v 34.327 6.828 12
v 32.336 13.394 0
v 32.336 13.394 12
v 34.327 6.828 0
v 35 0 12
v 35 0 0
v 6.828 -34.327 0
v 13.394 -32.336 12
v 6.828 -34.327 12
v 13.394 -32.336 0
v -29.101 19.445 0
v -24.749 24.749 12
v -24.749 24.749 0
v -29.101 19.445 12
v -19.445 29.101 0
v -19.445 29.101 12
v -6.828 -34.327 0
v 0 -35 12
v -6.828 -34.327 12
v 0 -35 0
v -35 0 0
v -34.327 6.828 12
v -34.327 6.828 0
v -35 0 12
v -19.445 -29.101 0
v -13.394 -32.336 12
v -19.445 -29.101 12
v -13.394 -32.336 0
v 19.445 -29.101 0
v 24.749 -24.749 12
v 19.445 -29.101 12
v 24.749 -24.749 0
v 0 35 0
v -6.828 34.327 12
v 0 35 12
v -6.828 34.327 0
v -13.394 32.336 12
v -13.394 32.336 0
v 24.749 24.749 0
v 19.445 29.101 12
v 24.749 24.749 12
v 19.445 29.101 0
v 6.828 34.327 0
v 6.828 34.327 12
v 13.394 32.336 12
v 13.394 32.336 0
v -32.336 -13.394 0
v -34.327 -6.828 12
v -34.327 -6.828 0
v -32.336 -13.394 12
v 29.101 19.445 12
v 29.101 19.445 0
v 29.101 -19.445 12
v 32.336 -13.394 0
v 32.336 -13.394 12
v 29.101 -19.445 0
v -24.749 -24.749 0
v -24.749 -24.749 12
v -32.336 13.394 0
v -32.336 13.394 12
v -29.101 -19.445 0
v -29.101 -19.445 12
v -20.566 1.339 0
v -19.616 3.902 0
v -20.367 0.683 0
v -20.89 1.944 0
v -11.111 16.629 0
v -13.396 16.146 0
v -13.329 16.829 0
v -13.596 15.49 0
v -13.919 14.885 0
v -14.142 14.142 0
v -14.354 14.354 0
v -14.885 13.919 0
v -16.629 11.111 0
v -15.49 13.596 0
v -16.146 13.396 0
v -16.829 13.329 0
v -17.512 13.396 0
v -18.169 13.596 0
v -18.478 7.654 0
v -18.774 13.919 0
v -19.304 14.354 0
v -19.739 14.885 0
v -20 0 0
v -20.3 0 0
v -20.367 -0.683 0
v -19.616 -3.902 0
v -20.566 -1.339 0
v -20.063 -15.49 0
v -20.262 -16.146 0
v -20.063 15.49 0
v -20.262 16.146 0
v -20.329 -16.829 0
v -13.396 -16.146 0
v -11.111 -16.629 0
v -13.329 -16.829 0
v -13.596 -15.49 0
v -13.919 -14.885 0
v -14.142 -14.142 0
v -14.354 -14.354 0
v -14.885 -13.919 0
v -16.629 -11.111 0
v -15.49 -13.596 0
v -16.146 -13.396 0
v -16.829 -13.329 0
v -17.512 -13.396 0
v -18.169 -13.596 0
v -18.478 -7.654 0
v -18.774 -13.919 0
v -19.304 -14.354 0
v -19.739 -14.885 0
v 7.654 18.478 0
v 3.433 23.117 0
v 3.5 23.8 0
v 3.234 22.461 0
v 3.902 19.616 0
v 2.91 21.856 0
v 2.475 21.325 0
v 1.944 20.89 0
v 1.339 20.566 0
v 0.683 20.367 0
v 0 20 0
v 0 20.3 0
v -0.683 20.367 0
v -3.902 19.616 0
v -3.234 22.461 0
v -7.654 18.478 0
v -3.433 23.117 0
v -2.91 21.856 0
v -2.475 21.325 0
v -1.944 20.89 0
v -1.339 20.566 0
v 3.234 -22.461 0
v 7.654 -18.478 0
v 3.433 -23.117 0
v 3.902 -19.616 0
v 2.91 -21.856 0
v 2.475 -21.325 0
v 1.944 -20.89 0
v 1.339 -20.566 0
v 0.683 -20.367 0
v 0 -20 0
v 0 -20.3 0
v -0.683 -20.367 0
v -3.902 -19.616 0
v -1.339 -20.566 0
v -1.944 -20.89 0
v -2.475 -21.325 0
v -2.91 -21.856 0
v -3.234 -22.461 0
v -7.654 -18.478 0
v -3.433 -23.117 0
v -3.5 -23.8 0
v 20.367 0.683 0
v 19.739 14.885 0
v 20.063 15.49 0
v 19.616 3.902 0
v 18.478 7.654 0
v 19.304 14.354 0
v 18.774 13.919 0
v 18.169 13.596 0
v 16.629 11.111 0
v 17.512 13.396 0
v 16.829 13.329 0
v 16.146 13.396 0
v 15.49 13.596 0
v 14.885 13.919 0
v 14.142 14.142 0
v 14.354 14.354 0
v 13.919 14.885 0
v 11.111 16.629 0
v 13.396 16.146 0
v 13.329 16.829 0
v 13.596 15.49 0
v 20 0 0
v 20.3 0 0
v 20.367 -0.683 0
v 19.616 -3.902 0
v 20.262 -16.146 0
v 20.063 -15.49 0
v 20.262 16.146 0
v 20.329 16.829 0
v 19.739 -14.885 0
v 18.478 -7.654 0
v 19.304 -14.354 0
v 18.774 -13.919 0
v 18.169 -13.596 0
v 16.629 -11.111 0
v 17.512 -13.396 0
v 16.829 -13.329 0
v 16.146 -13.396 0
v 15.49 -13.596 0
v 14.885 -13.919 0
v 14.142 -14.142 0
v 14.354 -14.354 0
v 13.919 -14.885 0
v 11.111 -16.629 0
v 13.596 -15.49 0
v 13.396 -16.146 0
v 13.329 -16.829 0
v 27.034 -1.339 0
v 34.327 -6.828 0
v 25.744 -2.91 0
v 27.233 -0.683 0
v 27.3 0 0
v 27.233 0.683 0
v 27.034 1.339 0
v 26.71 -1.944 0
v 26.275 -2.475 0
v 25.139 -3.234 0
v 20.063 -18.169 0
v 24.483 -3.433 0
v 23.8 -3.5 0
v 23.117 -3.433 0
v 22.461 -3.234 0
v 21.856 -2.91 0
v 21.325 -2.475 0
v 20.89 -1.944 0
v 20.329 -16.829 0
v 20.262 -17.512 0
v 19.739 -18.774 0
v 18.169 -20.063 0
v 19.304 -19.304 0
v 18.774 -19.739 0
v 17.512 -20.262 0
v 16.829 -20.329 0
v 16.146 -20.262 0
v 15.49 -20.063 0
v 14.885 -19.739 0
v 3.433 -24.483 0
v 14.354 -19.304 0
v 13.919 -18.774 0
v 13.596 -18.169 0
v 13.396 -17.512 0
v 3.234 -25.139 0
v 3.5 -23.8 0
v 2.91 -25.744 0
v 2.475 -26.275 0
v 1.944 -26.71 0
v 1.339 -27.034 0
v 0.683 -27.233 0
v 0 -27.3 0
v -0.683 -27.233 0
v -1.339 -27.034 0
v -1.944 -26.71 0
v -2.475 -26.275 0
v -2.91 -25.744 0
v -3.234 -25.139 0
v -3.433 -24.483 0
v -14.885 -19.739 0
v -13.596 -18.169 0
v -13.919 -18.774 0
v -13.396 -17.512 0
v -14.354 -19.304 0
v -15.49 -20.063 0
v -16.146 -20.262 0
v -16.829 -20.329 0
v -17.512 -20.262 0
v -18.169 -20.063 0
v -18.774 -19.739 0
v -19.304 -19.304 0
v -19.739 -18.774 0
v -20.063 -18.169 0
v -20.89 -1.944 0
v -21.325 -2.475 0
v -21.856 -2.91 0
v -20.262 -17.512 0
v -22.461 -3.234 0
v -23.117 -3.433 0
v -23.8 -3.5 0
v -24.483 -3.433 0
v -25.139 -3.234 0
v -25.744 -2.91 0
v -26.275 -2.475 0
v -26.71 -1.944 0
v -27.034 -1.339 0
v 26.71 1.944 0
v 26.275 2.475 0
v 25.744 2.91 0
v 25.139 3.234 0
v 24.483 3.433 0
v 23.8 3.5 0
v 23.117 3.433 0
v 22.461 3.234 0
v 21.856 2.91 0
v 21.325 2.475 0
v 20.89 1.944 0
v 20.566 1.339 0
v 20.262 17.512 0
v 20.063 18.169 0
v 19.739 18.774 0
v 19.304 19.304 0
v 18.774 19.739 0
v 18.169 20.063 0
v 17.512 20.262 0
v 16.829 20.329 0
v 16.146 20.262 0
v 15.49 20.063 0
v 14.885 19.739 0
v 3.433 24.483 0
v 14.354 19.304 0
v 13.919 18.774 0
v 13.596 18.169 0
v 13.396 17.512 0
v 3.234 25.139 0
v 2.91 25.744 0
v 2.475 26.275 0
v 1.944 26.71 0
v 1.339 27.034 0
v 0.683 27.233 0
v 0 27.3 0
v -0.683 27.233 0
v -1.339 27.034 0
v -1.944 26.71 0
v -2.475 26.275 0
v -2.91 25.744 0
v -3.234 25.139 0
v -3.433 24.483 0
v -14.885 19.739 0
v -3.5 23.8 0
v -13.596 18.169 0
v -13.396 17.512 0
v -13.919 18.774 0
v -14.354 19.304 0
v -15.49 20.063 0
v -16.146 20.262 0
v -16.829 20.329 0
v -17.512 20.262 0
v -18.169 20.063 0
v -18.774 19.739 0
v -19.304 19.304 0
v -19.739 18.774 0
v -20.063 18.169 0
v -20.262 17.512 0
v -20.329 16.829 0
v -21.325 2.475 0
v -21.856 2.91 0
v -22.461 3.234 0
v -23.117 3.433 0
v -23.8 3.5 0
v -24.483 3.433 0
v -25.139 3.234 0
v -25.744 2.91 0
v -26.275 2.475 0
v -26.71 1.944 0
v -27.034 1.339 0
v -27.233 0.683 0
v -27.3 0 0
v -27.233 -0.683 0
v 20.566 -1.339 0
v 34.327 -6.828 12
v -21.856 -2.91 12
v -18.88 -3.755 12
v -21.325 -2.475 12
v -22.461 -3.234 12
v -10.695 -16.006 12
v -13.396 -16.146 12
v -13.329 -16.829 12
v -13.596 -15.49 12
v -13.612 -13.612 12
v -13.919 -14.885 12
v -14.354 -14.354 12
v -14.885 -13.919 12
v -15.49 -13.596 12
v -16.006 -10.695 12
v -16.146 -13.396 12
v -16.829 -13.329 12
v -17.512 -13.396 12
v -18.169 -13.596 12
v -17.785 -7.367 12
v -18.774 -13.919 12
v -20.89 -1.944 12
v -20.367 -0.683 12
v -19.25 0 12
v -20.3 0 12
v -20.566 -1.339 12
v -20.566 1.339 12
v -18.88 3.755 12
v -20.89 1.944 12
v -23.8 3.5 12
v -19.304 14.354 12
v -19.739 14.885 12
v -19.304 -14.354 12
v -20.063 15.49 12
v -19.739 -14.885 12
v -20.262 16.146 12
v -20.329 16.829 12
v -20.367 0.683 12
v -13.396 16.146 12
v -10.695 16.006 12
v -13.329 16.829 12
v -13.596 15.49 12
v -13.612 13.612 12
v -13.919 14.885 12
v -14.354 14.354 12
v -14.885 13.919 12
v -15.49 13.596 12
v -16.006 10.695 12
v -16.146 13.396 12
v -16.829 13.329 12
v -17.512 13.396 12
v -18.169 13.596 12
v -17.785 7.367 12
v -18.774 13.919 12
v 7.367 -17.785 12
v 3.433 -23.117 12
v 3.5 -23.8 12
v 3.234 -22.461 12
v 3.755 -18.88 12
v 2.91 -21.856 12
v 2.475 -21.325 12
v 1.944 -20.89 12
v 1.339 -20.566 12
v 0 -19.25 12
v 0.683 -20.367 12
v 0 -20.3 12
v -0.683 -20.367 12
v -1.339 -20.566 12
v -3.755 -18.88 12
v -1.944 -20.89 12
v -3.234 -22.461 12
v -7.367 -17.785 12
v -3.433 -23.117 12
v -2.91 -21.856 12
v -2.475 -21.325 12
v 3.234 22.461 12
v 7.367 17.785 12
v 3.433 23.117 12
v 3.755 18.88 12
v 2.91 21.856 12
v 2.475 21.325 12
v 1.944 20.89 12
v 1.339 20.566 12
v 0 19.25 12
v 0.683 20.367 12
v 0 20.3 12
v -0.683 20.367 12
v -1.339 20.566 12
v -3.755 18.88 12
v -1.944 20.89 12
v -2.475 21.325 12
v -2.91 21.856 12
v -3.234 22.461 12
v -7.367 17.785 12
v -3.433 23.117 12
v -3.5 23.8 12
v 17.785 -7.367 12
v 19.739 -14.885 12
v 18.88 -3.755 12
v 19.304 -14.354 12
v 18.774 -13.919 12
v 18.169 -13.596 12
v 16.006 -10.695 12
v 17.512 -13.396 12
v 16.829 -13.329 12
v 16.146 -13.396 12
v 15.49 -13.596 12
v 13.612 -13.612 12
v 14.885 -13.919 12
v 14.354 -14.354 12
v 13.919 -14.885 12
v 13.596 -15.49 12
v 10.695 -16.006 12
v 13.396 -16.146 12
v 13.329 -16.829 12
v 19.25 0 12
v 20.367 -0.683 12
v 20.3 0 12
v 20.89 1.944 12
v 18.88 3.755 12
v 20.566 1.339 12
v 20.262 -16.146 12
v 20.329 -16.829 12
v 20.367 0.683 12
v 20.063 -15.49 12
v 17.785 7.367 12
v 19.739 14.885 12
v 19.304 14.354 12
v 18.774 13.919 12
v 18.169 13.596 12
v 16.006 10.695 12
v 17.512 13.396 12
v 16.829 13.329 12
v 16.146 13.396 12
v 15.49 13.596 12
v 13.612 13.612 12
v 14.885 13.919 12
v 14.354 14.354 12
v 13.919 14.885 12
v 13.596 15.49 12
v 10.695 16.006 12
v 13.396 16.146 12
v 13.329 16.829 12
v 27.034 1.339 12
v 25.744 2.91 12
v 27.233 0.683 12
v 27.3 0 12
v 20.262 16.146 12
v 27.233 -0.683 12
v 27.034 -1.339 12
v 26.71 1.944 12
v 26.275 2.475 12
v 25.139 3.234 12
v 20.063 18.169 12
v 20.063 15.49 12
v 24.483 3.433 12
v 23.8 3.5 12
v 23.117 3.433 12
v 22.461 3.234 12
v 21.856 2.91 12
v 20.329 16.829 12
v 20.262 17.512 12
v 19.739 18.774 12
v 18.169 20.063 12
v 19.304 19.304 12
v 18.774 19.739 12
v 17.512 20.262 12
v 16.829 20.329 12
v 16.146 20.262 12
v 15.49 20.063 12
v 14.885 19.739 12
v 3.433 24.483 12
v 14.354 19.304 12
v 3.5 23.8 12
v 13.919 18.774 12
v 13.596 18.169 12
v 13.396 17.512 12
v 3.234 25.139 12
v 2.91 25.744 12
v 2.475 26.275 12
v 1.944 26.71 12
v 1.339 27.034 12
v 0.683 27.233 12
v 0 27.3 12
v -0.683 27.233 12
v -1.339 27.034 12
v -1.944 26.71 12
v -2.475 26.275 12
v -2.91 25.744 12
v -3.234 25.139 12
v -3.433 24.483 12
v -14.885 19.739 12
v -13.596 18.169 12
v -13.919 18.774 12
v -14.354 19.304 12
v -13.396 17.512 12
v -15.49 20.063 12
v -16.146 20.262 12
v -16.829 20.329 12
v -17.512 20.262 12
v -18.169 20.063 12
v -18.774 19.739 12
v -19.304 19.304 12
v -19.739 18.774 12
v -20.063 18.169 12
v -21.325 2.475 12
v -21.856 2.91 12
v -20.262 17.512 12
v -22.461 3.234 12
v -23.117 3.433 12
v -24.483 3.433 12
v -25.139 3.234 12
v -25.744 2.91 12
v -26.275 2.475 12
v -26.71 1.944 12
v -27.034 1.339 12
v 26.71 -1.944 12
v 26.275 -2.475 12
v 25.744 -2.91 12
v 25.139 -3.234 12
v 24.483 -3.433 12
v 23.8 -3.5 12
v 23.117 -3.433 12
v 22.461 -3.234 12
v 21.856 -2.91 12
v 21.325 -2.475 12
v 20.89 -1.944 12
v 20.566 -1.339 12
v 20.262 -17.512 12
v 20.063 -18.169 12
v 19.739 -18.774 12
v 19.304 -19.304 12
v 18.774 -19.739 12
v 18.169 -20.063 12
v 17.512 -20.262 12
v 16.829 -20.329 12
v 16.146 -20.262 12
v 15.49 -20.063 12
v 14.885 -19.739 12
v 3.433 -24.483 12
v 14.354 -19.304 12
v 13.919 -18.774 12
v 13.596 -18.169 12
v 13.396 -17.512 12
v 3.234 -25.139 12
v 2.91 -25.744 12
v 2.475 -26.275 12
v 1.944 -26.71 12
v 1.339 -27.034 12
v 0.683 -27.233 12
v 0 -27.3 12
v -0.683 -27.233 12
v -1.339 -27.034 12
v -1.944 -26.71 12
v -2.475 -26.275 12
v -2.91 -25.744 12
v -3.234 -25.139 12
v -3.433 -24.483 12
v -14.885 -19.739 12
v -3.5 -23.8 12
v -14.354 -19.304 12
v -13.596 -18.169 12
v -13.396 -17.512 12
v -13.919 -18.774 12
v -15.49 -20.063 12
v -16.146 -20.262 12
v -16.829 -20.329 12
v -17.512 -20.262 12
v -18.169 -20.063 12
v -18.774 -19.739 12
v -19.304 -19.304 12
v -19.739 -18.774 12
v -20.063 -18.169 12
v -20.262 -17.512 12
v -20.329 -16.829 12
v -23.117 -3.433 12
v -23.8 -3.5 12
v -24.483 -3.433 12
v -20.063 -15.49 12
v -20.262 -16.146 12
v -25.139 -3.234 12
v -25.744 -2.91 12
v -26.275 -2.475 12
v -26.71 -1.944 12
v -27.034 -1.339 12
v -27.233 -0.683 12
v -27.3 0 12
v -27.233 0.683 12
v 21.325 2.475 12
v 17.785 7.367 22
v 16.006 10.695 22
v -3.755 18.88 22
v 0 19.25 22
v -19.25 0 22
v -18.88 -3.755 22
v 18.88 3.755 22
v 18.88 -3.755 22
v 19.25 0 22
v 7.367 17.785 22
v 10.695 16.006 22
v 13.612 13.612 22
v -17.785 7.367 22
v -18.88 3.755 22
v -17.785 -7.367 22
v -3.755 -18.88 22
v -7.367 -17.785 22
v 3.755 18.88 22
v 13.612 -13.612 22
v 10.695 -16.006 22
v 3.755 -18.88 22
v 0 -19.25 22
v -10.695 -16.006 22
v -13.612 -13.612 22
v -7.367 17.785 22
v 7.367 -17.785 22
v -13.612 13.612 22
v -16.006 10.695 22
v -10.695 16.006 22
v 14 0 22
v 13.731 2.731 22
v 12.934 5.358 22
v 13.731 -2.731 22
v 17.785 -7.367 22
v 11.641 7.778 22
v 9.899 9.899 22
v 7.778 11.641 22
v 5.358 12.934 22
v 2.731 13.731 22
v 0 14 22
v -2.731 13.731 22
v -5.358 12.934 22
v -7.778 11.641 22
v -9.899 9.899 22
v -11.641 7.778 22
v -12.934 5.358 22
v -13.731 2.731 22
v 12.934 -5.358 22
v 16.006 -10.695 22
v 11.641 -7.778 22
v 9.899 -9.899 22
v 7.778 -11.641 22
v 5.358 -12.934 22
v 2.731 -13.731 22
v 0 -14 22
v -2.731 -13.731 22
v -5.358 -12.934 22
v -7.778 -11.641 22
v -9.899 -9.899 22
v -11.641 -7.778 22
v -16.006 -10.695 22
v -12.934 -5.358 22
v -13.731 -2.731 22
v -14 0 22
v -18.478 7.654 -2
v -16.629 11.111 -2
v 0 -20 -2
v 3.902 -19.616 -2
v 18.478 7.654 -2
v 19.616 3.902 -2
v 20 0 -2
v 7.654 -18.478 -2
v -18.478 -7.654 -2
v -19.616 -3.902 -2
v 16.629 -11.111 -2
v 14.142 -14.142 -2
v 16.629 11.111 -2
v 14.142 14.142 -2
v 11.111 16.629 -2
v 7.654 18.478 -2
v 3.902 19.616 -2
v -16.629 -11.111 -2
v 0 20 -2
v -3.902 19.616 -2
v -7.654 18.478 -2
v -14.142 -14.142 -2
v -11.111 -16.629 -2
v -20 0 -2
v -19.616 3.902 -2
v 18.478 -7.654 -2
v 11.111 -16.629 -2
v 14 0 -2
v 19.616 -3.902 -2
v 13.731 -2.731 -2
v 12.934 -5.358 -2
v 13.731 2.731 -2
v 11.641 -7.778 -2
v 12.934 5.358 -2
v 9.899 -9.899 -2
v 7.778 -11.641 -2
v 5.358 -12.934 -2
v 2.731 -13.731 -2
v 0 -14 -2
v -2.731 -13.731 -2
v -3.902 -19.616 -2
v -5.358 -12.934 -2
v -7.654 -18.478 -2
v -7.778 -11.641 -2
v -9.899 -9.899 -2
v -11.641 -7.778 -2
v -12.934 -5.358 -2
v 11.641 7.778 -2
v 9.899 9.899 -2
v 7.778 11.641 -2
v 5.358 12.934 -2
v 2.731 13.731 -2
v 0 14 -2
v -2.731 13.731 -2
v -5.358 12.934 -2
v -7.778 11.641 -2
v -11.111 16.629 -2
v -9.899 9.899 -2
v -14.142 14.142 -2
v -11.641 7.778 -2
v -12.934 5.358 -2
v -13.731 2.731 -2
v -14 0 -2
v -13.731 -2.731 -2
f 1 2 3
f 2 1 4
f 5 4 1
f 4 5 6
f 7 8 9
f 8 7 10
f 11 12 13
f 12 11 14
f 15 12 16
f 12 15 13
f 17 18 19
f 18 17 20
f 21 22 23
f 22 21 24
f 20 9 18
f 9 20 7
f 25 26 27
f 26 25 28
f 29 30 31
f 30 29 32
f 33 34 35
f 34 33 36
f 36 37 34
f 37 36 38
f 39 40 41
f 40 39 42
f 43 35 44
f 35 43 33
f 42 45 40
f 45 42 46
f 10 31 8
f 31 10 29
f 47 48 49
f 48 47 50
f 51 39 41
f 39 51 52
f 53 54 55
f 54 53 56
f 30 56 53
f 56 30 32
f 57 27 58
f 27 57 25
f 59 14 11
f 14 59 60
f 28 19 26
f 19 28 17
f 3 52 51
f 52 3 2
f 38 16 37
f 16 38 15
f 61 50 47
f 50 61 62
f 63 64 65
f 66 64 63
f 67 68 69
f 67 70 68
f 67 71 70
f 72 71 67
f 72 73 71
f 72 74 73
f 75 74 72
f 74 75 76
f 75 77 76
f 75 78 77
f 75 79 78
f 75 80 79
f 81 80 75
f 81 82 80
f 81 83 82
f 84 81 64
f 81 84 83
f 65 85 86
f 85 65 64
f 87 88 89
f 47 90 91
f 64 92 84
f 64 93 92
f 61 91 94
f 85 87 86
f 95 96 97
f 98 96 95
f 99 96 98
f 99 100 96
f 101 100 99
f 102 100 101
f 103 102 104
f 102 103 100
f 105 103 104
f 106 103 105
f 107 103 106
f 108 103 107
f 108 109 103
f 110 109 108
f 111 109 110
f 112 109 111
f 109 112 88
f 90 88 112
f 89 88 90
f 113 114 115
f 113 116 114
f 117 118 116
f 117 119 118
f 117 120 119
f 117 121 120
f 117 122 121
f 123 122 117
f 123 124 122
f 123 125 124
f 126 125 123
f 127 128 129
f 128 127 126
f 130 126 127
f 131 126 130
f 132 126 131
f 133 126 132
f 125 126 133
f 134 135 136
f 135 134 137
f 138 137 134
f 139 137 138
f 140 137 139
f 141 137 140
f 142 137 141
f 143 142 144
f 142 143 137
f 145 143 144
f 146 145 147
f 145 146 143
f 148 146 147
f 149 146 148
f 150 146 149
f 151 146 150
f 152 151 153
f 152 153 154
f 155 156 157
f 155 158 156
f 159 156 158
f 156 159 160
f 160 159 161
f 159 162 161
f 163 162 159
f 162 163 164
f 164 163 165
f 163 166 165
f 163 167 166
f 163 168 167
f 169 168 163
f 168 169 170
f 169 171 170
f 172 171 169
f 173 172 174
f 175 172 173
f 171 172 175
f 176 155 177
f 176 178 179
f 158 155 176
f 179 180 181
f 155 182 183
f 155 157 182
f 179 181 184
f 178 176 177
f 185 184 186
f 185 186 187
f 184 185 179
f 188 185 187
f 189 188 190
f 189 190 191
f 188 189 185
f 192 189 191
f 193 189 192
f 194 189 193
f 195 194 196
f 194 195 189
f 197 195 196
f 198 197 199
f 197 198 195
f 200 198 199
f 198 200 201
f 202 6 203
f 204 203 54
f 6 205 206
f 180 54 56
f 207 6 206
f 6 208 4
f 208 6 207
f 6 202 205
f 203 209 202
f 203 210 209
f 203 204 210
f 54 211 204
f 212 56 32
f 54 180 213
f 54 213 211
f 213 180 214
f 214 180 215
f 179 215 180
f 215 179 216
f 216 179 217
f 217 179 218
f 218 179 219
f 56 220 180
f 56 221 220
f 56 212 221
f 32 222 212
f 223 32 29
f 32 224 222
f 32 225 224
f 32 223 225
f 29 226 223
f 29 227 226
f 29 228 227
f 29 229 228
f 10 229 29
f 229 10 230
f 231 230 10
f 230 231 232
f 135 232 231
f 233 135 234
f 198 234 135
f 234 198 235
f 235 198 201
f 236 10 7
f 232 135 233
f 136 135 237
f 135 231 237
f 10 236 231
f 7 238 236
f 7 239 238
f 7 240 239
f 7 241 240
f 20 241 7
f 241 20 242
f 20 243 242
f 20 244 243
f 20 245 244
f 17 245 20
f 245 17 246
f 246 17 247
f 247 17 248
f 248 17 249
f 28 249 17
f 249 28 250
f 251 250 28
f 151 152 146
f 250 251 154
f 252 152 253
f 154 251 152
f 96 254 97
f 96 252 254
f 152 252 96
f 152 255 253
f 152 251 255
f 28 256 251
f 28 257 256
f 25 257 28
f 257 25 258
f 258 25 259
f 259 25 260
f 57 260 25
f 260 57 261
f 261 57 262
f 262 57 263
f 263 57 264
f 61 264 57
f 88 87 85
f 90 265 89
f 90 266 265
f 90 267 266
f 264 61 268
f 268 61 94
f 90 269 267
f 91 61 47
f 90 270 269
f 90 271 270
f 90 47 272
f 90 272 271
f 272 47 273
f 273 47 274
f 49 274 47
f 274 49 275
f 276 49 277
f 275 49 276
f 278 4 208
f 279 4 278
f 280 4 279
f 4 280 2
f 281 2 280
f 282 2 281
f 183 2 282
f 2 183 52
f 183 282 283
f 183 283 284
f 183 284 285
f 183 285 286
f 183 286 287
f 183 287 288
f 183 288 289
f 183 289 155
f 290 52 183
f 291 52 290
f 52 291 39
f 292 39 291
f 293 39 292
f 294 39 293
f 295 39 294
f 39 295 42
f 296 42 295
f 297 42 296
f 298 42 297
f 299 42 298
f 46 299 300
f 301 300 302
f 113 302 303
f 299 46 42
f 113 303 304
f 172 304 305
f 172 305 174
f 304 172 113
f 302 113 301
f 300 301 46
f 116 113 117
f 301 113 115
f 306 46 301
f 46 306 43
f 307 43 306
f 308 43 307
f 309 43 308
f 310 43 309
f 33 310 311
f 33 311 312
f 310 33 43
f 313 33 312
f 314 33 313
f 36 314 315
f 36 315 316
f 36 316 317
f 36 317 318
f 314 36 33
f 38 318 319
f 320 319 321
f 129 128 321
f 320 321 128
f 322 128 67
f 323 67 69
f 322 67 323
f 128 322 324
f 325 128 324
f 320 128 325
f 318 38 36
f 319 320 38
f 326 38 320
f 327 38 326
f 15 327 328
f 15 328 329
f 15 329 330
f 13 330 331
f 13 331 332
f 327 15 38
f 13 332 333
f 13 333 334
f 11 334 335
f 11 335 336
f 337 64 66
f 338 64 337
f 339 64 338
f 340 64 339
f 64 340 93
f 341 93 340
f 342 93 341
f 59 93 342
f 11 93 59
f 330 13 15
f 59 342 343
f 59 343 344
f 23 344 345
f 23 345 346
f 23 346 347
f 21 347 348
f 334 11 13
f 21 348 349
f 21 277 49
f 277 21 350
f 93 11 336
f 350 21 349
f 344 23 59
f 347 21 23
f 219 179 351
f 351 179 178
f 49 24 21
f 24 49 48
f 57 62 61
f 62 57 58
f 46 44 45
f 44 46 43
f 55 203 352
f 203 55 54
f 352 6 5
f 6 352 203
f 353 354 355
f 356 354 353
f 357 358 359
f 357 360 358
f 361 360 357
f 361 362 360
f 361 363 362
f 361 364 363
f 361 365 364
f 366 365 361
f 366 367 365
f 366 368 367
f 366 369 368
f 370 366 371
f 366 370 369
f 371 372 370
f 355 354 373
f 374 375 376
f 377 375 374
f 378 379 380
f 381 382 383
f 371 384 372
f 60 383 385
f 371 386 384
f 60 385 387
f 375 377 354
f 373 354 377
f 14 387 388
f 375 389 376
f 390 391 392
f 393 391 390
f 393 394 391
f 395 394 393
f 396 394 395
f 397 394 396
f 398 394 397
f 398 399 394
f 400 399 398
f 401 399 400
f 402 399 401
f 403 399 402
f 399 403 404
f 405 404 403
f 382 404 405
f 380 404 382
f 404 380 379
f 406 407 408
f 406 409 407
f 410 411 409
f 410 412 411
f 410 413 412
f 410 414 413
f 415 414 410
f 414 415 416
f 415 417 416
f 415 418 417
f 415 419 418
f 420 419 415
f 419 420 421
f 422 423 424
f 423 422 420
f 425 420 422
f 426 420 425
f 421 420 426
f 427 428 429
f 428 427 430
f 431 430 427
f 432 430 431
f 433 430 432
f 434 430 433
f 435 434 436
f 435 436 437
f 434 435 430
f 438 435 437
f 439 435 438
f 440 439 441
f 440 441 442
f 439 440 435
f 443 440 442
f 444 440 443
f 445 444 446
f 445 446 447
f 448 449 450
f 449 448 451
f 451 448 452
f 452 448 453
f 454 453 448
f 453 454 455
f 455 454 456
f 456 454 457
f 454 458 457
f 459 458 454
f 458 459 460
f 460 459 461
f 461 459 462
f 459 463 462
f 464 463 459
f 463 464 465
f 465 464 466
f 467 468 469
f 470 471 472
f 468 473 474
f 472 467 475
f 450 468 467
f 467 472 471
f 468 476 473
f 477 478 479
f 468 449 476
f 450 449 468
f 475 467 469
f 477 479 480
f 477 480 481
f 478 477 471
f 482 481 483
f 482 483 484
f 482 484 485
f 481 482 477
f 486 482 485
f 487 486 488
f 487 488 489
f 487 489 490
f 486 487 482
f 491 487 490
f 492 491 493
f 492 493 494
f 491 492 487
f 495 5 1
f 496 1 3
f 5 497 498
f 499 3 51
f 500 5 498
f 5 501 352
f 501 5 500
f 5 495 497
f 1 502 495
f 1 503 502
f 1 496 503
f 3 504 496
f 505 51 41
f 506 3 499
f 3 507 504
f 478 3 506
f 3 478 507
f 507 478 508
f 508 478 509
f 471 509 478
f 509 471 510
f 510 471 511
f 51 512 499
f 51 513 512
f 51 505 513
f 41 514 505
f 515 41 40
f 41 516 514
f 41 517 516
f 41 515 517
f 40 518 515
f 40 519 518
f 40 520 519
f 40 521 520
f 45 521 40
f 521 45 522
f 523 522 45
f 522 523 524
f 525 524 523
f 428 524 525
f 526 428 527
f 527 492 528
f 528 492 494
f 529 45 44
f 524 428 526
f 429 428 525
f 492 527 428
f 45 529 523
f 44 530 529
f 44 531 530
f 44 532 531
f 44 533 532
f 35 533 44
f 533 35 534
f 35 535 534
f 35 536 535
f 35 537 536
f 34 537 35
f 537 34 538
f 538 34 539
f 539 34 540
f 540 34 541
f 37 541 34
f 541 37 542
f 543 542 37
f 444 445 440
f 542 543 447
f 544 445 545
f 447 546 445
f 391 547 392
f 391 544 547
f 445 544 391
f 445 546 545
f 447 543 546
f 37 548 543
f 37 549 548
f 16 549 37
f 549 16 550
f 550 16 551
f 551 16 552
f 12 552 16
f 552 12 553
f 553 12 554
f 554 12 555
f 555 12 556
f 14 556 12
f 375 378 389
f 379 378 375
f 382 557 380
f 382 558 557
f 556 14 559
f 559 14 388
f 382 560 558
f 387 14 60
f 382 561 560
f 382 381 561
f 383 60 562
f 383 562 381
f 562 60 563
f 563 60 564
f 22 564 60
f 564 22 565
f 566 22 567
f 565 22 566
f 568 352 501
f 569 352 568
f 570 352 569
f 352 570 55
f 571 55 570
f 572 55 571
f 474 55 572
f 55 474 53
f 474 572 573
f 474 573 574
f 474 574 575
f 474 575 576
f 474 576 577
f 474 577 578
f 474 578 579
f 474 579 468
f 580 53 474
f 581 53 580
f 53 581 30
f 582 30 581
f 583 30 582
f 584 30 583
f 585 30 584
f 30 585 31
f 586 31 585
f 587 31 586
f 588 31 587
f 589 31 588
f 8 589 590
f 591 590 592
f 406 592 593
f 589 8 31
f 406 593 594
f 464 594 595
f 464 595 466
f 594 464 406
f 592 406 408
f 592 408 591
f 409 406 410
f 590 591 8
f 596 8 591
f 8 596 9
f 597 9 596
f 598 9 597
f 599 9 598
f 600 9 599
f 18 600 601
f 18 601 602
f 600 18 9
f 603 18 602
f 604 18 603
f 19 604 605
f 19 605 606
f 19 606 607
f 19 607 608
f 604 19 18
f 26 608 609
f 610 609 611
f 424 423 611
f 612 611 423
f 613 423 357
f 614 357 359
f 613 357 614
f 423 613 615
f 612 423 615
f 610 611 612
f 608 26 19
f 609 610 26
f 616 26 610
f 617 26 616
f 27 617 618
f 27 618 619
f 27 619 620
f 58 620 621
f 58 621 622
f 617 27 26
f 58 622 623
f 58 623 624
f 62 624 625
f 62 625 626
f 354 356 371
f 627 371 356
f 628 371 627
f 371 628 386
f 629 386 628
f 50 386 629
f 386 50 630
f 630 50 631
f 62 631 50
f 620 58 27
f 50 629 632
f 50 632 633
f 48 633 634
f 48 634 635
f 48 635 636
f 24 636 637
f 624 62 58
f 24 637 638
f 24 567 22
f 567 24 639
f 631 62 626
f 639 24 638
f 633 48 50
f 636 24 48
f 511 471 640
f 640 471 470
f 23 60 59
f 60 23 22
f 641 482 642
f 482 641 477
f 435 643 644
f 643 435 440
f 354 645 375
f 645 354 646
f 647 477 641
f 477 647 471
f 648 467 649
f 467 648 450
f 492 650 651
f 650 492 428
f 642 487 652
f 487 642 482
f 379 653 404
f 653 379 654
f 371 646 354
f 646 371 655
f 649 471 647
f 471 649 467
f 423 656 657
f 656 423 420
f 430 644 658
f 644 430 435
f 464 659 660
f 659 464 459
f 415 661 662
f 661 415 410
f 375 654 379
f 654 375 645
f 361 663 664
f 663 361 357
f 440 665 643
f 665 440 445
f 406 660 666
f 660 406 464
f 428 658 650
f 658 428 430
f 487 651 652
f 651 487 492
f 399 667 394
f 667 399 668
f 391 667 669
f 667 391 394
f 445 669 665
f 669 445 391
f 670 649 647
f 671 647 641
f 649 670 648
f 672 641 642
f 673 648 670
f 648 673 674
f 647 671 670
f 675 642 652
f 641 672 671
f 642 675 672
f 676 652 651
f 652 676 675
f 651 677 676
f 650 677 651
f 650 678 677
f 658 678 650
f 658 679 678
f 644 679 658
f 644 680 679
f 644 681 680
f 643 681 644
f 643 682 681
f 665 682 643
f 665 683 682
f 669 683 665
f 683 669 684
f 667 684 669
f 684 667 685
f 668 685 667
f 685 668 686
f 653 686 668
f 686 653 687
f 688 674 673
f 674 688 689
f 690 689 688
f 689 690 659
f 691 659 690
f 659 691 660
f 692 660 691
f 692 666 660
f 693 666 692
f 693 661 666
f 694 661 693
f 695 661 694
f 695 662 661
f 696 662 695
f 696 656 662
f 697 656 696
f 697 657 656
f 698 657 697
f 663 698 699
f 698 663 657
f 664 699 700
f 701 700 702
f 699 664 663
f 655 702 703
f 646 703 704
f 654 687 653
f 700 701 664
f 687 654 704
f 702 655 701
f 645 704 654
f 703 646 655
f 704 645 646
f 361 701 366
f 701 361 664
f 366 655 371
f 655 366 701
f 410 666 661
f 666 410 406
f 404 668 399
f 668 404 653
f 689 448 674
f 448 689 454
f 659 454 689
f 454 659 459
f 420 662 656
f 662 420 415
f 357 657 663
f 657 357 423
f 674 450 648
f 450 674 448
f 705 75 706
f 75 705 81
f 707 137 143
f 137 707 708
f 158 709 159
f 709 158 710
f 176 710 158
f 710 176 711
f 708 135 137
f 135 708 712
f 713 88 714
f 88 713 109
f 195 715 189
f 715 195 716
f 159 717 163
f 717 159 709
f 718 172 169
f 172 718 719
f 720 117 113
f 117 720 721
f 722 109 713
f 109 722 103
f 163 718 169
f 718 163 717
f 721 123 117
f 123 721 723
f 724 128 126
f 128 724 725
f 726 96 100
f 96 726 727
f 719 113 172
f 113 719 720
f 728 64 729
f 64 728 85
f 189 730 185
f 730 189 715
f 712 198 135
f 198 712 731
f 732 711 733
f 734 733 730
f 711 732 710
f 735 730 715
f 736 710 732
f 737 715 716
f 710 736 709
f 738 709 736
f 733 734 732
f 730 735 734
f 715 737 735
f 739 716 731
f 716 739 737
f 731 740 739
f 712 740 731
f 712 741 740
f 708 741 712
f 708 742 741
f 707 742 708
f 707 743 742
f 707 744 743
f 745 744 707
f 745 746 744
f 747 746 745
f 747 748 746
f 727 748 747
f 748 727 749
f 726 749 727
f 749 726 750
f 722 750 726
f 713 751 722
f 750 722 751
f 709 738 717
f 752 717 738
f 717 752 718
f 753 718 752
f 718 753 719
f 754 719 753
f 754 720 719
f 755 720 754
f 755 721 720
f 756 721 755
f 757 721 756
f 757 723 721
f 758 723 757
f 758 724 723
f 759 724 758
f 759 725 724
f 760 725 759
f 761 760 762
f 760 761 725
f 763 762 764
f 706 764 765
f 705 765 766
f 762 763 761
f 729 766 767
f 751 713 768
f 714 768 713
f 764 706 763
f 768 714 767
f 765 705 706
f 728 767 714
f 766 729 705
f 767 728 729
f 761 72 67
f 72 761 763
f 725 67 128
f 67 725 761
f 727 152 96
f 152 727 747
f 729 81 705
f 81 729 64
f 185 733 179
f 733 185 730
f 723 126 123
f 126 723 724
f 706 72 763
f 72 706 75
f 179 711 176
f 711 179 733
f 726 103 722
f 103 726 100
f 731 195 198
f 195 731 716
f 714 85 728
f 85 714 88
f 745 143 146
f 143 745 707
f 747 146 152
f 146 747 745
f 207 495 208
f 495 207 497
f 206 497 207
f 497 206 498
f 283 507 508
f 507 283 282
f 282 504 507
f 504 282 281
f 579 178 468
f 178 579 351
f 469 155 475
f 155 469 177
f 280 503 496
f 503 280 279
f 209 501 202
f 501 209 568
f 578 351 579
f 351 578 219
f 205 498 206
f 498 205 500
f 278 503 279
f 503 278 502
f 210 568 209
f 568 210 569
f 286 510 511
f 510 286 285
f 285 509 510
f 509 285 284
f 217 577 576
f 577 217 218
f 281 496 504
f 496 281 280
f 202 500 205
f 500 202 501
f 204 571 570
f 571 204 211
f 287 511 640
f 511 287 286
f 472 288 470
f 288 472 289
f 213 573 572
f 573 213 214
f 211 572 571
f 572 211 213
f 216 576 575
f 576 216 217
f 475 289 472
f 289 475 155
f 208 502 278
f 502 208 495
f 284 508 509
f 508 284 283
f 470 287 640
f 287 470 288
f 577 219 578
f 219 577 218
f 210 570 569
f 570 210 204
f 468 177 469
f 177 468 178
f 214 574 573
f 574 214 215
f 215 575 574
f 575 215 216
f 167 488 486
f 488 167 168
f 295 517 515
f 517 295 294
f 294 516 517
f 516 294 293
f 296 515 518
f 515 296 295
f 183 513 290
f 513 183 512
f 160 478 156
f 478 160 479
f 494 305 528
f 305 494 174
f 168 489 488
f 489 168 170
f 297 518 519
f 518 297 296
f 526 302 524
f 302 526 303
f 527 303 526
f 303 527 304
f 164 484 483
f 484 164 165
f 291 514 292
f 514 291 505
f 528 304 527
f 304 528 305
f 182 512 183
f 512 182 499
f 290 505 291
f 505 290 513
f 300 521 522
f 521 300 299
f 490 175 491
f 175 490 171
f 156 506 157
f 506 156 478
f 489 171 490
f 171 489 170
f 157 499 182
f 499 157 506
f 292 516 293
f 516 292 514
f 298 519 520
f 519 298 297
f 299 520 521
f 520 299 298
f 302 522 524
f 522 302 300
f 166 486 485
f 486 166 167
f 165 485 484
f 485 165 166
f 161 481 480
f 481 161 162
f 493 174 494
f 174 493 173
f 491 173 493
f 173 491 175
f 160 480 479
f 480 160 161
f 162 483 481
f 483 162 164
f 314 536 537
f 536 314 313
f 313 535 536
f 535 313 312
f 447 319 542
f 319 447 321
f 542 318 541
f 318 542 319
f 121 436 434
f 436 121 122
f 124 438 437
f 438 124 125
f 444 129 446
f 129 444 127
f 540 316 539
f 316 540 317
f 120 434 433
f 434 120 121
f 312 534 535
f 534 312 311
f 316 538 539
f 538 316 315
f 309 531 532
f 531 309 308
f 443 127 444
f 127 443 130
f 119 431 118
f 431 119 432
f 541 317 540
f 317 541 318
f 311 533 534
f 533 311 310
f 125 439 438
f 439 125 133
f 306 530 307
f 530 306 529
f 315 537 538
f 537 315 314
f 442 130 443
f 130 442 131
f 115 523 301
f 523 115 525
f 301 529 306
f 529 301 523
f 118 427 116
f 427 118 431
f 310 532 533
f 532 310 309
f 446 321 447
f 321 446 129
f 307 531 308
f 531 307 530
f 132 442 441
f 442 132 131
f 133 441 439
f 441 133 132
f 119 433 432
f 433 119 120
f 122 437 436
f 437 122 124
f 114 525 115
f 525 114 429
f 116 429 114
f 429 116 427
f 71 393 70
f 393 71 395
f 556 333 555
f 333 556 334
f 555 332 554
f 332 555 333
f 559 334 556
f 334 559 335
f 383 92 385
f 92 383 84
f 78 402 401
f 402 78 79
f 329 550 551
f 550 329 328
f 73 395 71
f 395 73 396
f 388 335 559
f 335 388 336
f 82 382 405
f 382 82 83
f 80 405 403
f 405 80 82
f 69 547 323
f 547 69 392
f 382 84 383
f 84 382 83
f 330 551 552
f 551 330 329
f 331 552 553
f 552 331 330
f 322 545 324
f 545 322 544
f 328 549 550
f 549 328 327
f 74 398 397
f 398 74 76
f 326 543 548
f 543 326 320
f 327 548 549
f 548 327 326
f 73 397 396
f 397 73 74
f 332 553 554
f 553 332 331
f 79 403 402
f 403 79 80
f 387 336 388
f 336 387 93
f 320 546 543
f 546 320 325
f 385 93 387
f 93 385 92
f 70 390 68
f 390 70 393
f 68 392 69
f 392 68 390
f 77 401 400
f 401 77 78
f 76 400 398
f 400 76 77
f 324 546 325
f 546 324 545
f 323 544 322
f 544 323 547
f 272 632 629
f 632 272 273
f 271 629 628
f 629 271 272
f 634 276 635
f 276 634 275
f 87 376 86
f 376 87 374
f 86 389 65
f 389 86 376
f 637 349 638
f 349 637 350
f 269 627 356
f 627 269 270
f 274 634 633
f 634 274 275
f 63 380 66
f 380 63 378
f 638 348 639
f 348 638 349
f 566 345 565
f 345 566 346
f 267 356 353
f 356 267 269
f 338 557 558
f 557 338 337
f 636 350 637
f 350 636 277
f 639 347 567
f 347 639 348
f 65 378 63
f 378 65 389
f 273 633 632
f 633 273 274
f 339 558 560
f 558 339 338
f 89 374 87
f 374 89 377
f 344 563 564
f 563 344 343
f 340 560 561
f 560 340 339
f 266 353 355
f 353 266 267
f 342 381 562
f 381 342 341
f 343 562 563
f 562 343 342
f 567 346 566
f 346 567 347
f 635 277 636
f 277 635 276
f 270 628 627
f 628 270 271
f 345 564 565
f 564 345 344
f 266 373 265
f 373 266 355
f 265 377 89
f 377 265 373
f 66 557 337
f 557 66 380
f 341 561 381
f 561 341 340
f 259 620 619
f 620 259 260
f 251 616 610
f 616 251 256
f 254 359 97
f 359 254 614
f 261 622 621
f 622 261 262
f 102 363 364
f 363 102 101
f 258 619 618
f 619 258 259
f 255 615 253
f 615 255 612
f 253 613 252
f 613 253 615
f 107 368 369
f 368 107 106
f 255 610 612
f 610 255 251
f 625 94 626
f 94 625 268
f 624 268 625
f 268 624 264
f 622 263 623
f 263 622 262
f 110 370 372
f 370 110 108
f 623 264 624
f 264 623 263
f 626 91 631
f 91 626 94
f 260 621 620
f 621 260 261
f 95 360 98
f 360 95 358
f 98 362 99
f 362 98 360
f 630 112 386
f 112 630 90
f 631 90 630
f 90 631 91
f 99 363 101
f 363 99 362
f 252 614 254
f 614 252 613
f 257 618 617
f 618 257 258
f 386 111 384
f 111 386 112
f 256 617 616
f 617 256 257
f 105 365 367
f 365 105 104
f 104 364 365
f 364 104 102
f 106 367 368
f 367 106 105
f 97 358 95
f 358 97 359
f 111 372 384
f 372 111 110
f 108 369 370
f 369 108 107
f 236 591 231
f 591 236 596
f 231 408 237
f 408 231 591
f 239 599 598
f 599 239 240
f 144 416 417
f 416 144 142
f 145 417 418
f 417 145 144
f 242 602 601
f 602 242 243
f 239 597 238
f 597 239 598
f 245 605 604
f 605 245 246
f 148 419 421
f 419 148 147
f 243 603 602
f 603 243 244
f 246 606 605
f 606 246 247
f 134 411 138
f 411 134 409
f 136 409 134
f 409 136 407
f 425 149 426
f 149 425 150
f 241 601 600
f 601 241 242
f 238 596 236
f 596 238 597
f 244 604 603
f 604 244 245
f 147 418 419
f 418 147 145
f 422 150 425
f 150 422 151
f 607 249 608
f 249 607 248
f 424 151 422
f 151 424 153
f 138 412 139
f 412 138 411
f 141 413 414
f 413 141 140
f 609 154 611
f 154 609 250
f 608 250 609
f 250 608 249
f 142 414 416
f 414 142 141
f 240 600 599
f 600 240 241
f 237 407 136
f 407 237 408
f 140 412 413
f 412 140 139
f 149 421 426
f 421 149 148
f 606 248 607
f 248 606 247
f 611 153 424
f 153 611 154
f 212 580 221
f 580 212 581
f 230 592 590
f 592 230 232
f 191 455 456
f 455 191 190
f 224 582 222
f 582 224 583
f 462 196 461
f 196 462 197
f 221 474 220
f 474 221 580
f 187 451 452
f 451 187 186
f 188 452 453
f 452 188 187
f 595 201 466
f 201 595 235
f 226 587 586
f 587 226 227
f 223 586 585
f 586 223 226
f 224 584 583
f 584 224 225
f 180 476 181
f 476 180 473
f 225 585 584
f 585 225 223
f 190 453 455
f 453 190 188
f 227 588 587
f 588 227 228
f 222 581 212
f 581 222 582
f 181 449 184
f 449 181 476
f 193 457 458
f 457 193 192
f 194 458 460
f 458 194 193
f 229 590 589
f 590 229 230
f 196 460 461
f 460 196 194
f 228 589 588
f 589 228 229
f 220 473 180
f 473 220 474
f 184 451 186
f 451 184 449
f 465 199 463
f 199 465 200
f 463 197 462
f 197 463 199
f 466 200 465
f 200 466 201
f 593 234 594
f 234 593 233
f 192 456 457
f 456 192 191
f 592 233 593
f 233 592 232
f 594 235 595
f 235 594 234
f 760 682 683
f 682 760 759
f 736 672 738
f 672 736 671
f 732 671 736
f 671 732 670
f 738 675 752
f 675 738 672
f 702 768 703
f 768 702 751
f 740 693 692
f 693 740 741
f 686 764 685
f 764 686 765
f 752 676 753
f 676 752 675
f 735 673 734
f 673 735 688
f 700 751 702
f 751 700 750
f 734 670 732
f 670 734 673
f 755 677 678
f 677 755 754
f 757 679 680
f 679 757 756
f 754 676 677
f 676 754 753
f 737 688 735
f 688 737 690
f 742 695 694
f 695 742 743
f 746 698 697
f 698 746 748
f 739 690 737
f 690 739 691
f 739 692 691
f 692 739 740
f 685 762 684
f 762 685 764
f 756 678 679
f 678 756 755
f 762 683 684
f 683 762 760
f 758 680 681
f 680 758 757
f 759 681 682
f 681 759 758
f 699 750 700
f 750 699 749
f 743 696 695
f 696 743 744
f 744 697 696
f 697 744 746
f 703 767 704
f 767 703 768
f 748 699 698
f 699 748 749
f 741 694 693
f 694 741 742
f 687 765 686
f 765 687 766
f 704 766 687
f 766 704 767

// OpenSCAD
$fn = 32;

// ----------------------------------------------------------------------
// Bolt-circle flange: 70 mm outside, 8 bolt holes, bore 28 mm
// ----------------------------------------------------------------------

// --- parameters (mm) ---
flange_d = 70;            // flange outside diameter
flange_t = 12;            // flange thickness
bolts = 8;                // number of bolt holes
bolt_d = 7;               // bolt clearance
bolt_r = 23.8;            // bolt circle radius
bore_d = 28;              // centre bore
hub_d = 38.5;             // raised hub diameter
hub_h = 10;               // raised hub height
spigot_d = 40;            // spigot diameter
spigot_h = 3;             // spigot height below the flange
sink = 1;                 // overlap into the flange

module body() {
  cylinder(h = flange_t, d = flange_d);
  /* raised hub, sunk 1 mm into the flange */
  translate([0, 0, flange_t - 1]) cylinder(h = hub_h + 1, d = hub_d);
  /* spigot on the back face, sunk into the flange */
  translate([0, 0, -spigot_h + sink]) cylinder(h = spigot_h, d = spigot_d);
}

difference() {
  body();
  /* bolt circle */
  for (i = [0 : bolts - 1]) rotate([0, 0, i * 360 / bolts]) translate([bolt_r, 0, -spigot_h - 1]) cylinder(h = flange_t + hub_h + spigot_h + 3, d = bolt_d);
  translate([0, 0, -spigot_h - 1]) cylinder(h = flange_t + hub_h + spigot_h + 3, d = bore_d);
}
